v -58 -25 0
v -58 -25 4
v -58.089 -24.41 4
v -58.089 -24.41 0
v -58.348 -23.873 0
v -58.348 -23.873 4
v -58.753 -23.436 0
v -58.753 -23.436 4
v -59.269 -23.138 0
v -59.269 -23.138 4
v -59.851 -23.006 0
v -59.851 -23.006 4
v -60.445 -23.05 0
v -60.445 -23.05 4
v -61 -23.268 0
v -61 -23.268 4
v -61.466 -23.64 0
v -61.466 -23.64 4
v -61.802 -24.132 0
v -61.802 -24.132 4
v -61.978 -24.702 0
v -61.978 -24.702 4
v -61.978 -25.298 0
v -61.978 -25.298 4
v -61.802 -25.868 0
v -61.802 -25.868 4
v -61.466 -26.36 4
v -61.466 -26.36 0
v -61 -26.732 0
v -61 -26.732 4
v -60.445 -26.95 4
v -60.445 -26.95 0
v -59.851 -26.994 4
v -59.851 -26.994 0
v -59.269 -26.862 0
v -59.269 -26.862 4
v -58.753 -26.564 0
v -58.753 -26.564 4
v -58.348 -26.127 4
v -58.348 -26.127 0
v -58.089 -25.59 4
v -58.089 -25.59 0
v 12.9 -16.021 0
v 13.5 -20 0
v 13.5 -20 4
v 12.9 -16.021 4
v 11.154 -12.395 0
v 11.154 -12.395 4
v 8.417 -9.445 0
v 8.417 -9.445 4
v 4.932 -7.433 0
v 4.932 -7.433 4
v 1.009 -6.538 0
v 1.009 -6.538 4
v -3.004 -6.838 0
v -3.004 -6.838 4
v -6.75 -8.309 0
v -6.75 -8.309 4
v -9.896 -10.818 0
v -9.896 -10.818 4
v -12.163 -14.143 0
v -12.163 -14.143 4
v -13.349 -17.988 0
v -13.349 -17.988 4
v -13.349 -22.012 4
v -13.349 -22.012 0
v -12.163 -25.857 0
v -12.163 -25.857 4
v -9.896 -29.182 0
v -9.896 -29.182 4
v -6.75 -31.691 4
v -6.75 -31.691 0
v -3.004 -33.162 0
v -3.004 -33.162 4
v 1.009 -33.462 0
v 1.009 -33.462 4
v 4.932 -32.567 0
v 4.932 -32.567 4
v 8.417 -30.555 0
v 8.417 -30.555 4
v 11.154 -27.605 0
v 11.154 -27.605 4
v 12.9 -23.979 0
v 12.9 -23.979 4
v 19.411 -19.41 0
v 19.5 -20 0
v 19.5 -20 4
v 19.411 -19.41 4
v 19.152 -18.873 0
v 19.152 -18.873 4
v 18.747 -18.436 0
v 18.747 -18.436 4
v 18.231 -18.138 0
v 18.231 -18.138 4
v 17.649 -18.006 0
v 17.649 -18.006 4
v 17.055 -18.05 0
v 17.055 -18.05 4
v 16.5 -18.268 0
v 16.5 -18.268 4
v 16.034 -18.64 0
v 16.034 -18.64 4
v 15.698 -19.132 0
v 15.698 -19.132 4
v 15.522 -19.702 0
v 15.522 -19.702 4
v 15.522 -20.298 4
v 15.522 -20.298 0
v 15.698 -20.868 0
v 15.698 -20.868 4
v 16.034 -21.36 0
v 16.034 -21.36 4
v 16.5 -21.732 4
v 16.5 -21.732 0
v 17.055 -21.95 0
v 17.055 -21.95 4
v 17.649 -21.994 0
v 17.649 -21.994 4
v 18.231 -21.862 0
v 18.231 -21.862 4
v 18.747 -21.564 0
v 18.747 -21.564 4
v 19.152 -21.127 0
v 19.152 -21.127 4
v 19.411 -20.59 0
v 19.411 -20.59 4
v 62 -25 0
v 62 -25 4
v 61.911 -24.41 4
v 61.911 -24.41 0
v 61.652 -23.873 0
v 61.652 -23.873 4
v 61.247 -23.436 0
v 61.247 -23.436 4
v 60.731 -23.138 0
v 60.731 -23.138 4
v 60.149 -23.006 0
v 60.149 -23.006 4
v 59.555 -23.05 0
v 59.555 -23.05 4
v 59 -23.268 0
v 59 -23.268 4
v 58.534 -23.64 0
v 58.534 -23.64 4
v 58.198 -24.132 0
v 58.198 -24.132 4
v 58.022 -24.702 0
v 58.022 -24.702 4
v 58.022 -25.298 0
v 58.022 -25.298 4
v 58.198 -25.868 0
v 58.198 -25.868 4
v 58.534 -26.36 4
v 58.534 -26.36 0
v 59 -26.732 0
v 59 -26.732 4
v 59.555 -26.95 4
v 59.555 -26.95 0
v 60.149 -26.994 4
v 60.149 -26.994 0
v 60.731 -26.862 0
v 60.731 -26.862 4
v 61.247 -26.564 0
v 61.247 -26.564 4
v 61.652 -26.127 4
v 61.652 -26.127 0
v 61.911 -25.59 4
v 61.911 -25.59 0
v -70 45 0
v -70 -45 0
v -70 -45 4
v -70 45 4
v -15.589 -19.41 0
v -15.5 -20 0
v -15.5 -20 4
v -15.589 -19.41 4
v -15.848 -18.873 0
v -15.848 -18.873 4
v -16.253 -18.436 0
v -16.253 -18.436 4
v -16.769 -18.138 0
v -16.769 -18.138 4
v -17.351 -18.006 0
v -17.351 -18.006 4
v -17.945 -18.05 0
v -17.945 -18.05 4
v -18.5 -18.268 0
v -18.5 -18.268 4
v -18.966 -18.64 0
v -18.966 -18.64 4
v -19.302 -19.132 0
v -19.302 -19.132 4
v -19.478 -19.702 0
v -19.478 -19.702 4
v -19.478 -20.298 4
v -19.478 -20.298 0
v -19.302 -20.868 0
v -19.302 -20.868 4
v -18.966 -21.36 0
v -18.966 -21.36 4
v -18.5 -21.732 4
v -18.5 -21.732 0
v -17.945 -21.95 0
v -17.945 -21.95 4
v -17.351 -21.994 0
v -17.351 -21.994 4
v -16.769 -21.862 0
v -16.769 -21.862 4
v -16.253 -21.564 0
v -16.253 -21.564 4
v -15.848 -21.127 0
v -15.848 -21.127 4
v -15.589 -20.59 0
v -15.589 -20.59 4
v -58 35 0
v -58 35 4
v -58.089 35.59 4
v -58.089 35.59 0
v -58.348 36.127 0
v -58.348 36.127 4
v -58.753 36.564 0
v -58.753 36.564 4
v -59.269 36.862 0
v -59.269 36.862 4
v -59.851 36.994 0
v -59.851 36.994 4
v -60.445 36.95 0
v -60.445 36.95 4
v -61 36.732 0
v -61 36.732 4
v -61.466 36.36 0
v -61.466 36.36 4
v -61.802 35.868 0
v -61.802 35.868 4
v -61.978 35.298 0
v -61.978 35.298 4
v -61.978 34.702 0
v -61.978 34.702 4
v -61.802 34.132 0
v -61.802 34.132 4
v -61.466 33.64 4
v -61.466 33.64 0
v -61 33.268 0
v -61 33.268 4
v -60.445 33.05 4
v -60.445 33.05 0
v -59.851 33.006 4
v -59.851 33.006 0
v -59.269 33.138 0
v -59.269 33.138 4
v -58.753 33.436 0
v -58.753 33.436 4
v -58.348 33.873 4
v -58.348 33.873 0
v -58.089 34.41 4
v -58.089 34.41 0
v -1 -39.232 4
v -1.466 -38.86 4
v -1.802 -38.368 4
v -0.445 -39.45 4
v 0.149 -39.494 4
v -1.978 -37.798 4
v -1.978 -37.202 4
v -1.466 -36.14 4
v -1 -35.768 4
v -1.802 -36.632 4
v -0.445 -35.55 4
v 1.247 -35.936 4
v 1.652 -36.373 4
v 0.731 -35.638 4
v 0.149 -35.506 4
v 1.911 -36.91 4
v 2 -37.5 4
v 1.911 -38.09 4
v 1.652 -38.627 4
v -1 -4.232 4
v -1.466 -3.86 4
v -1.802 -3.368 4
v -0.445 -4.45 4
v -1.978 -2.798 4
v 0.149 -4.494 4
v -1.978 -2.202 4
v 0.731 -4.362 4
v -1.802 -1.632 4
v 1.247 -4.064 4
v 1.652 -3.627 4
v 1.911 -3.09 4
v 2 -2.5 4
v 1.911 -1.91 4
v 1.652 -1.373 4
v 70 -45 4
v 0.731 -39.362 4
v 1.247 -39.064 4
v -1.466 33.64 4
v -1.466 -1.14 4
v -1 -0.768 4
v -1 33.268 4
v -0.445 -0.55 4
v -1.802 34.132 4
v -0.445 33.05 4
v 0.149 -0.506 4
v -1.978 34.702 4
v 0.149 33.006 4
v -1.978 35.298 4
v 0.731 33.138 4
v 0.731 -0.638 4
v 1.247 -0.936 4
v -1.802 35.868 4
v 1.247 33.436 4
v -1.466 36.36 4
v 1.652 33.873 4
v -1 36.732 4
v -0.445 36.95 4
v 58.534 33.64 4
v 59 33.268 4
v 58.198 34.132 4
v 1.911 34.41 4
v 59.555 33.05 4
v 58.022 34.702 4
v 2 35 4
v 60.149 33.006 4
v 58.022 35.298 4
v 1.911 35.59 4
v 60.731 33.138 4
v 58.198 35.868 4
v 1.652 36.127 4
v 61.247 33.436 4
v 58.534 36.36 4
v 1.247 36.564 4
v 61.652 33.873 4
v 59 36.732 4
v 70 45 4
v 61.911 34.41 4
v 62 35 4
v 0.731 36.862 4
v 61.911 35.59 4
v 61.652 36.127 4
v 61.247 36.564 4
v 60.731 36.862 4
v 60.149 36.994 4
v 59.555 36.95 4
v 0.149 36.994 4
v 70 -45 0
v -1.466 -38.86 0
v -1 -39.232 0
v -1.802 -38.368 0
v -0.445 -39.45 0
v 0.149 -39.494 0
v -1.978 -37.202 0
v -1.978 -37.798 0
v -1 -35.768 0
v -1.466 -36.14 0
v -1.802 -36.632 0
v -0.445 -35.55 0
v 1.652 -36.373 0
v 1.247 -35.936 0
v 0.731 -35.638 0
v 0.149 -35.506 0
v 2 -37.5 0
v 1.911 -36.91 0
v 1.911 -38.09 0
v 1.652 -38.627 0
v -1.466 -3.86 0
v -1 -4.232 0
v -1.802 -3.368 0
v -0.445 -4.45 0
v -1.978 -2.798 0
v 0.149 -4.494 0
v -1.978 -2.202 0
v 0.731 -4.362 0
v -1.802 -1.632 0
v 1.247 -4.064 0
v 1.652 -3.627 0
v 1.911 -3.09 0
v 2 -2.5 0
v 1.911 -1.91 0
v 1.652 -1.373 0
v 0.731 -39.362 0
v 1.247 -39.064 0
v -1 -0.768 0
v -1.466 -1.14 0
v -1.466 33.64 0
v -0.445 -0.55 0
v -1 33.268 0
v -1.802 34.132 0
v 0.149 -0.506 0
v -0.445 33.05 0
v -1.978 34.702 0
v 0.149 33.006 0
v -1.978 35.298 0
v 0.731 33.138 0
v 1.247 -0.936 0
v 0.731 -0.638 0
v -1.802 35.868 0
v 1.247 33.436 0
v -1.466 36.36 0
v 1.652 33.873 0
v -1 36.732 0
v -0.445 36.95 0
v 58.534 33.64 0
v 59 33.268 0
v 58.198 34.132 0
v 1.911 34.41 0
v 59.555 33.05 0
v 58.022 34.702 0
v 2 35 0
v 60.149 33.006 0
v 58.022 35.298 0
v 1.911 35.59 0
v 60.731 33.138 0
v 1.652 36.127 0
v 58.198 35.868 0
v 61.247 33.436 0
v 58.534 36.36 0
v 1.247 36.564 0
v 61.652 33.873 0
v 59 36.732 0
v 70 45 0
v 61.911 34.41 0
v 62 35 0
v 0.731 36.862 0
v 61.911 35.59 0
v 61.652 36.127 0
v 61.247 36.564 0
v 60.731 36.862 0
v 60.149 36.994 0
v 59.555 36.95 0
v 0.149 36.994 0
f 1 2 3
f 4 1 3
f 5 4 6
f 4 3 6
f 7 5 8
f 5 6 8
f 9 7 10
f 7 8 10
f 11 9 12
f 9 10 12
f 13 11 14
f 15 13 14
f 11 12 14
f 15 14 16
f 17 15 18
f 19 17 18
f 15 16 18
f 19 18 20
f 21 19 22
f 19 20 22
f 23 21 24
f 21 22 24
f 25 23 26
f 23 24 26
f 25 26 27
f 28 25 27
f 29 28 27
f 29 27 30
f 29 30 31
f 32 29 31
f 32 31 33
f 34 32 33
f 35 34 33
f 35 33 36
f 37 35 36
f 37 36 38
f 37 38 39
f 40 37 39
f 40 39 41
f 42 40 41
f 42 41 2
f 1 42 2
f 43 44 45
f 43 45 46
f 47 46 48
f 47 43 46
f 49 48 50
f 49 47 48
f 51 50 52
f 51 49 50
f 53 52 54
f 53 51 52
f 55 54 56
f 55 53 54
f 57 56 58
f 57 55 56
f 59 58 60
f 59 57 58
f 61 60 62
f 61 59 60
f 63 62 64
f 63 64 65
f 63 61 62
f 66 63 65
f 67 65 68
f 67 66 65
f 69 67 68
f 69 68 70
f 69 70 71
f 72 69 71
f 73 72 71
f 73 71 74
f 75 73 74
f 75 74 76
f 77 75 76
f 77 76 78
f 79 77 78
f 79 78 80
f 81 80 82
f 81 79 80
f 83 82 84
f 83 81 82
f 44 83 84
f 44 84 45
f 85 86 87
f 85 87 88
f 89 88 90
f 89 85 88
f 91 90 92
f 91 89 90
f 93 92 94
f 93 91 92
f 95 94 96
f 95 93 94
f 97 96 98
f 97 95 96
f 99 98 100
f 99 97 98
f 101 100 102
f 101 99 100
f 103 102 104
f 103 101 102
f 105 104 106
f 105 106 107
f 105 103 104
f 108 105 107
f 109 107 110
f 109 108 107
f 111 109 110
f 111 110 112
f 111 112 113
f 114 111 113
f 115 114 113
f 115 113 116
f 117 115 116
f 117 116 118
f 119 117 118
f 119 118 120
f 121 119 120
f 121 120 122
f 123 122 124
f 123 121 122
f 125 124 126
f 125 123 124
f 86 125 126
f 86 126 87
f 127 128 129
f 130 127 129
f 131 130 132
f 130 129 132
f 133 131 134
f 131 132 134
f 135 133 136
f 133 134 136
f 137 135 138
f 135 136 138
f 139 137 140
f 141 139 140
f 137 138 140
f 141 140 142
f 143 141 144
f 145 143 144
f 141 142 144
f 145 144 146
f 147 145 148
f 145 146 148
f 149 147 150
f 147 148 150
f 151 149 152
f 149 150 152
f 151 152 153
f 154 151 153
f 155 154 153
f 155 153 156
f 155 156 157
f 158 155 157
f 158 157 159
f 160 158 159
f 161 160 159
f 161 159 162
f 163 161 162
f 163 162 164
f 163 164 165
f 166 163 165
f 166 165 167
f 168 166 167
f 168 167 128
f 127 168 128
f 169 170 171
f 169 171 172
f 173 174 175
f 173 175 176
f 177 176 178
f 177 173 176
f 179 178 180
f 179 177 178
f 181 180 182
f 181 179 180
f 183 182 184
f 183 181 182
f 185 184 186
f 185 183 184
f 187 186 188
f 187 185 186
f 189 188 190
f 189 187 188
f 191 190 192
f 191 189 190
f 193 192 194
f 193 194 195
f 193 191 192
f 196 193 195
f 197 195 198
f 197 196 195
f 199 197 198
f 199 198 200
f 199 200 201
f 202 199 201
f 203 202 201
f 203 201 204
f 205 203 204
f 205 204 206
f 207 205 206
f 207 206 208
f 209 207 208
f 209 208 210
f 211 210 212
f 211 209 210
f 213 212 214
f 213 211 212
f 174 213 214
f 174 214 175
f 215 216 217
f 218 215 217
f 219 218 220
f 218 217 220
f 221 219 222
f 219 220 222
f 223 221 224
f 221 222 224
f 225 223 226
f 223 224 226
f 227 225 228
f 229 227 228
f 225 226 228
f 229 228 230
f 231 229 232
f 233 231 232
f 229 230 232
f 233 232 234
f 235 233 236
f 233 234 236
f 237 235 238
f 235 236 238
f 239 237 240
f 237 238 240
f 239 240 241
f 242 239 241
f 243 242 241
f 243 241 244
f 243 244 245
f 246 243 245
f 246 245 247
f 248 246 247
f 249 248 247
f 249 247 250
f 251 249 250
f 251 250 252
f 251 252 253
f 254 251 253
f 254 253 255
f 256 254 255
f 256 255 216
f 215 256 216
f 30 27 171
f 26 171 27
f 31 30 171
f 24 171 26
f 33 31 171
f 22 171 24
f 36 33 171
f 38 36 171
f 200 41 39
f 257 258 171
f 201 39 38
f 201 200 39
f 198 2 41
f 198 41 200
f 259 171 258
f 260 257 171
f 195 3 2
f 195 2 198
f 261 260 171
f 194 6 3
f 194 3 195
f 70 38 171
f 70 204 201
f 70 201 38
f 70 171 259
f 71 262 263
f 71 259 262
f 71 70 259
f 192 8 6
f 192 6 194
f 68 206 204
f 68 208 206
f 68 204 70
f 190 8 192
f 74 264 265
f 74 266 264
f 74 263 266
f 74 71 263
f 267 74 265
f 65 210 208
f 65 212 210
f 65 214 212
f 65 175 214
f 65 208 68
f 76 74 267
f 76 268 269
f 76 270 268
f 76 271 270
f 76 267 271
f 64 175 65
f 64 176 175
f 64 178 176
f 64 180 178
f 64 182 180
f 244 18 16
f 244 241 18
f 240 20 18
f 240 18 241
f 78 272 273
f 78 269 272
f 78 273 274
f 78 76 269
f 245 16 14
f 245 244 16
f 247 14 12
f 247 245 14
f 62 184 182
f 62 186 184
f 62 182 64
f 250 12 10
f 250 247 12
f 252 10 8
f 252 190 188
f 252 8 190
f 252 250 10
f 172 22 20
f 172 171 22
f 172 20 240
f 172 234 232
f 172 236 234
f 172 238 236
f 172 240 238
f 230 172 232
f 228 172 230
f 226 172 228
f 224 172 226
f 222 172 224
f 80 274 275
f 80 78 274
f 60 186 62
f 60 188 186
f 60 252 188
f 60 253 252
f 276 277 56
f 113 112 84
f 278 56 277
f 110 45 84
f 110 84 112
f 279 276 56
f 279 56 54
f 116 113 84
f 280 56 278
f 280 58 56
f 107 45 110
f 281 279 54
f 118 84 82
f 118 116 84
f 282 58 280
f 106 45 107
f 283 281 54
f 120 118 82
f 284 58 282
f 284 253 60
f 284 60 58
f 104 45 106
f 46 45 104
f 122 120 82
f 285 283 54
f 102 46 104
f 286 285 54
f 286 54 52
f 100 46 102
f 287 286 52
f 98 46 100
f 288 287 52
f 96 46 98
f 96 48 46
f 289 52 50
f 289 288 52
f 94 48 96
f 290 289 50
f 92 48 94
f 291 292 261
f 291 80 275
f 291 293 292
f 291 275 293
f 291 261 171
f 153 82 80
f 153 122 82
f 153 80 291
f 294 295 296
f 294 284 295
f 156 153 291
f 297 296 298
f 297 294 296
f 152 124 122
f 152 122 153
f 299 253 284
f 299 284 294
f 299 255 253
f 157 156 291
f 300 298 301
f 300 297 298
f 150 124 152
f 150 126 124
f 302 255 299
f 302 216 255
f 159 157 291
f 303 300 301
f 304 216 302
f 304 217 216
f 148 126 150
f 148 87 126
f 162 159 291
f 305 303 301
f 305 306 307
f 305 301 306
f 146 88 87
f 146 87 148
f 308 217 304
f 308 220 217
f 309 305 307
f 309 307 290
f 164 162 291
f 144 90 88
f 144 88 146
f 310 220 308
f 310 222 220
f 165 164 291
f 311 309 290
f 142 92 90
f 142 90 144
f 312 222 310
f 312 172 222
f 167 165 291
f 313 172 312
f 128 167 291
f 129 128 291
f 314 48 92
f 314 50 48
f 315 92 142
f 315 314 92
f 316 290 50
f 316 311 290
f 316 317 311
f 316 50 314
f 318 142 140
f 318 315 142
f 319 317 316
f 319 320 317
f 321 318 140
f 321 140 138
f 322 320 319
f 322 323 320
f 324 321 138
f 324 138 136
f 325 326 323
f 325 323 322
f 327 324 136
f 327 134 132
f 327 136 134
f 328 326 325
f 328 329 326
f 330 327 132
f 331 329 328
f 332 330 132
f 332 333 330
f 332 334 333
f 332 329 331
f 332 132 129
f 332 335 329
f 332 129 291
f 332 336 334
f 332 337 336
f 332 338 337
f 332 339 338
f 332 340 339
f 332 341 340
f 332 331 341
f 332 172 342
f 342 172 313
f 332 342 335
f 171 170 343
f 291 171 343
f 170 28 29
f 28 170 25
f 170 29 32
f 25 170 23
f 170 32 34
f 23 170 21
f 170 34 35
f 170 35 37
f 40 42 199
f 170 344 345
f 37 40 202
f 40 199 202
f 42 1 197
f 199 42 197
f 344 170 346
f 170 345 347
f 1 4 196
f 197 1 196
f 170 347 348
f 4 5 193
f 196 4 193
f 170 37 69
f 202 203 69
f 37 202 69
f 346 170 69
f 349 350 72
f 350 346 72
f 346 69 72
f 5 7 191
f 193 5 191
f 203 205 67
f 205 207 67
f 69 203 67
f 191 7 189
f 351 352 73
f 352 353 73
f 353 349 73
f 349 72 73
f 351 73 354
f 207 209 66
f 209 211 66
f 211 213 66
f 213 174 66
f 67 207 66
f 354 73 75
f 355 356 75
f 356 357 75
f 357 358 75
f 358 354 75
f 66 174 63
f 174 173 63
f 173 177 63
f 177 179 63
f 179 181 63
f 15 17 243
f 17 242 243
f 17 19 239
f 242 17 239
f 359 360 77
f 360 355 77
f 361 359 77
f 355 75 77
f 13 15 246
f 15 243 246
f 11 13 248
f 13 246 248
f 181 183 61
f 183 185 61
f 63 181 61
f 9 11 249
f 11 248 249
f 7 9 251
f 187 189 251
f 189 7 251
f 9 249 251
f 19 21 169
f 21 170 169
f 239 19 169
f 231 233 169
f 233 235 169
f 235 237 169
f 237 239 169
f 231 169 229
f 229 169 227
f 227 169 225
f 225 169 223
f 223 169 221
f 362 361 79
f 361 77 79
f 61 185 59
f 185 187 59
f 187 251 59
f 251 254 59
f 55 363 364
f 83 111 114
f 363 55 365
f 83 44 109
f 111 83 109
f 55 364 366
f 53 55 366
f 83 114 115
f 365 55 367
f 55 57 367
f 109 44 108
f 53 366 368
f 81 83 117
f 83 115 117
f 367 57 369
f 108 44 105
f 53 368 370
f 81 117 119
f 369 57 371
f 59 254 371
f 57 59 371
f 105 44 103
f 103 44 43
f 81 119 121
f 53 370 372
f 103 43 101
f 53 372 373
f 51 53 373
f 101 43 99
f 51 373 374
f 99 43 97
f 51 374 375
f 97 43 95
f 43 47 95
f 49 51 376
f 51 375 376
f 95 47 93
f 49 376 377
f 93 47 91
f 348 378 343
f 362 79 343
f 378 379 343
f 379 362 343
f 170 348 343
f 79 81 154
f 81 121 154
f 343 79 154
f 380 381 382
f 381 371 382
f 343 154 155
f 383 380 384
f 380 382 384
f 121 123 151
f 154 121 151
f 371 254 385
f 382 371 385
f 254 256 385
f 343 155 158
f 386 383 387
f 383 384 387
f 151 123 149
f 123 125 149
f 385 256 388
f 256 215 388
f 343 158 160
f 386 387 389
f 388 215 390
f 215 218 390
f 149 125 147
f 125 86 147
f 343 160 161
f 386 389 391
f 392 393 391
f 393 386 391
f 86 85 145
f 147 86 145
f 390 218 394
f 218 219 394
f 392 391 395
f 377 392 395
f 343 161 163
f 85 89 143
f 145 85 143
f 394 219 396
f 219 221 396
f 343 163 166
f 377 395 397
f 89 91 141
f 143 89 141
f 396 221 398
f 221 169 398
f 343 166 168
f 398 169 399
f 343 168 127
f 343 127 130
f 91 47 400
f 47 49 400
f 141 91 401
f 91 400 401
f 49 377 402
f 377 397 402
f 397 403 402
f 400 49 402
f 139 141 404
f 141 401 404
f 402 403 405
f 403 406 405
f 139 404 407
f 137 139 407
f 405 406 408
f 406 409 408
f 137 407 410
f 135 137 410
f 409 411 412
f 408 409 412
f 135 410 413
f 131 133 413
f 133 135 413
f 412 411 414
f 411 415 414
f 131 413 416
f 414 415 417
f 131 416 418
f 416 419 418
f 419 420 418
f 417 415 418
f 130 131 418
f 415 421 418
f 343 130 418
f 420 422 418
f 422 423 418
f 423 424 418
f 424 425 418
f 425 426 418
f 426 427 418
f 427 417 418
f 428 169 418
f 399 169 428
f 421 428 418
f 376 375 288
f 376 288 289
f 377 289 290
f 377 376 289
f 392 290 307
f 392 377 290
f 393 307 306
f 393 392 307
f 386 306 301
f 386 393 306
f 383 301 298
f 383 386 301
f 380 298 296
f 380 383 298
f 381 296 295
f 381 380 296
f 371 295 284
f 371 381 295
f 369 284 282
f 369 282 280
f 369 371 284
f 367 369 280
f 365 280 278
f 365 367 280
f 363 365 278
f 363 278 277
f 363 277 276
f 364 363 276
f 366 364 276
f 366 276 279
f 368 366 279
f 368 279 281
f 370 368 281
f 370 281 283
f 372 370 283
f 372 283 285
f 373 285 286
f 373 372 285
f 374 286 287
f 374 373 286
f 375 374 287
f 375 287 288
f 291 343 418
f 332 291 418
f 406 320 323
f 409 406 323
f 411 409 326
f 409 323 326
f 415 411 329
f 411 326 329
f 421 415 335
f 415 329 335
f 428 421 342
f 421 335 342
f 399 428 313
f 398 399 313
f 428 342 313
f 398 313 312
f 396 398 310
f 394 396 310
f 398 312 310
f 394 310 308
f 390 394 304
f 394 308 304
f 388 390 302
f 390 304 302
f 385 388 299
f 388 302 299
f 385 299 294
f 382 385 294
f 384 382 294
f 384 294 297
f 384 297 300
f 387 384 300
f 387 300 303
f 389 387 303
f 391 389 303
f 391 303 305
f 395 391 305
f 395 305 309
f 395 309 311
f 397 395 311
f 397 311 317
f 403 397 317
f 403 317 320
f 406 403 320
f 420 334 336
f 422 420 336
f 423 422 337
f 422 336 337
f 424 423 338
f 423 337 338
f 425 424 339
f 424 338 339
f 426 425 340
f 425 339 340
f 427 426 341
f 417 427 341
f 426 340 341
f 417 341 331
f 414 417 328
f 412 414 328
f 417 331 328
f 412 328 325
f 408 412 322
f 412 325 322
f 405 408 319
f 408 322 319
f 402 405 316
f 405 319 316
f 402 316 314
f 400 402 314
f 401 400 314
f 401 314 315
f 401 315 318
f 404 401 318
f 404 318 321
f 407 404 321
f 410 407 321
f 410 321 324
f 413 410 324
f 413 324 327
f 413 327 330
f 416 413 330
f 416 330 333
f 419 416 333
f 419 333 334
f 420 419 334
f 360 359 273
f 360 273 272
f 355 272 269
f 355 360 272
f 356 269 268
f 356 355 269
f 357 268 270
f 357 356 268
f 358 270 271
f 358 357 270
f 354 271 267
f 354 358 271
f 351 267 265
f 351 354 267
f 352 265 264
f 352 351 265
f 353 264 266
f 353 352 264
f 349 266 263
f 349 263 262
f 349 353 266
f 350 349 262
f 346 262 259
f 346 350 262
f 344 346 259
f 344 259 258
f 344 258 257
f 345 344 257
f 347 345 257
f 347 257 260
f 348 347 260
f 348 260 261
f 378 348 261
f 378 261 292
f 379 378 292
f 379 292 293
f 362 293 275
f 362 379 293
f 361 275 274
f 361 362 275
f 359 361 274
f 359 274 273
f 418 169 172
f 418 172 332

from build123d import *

# Parameters (mm, degrees)
SKETCH1_W           = 140
SKETCH1_H           = 90
SKETCH1_R           = 2
SKETCH1_R_2         = 13.5
BOSS_EXTRUDE1_DEPTH = 4
SKETCH2_R           = 2
CUT_EXTRUDE1_DEPTH  = 5
SKETCH3_R           = 2
CUT_EXTRUDE2_DEPTH  = 5


with BuildPart() as part:
    # Sketch1 → Boss-Extrude1 (new body)
    with BuildSketch(Plane.XY):
        Rectangle(SKETCH1_W, SKETCH1_H)
        with Locations((0, -2.5)):
            Circle(SKETCH1_R, mode=Mode.SUBTRACT)
        with Locations((17.5, -20)):
            Circle(SKETCH1_R, mode=Mode.SUBTRACT)
        with Locations((0, -37.5)):
            Circle(SKETCH1_R, mode=Mode.SUBTRACT)
        with Locations((-17.5, -20)):
            Circle(SKETCH1_R, mode=Mode.SUBTRACT)
        with Locations((0, -20)):
            Circle(SKETCH1_R_2, mode=Mode.SUBTRACT)
    extrude(amount=BOSS_EXTRUDE1_DEPTH)

    # Sketch2 → Cut-Extrude1 (cut, through all)
    with BuildSketch(Plane.XY.offset(4)):
        with Locations((0, 35)):
            Circle(SKETCH2_R)
        with Locations((-60, 35)):
            Circle(SKETCH2_R)
        with Locations((60, 35)):
            Circle(SKETCH2_R)
    extrude(amount=-CUT_EXTRUDE1_DEPTH, mode=Mode.SUBTRACT)

    # Sketch3 → Cut-Extrude2 (cut, through all)
    with BuildSketch(Plane.XY.offset(4)):
        with Locations((-60, -25)):
            Circle(SKETCH3_R)
        with Locations((-60, -85)):
            Circle(SKETCH3_R)
        with Locations((60, -85)):
            Circle(SKETCH3_R)
        with Locations((60, -25)):
            Circle(SKETCH3_R)
    extrude(amount=-CUT_EXTRUDE2_DEPTH, mode=Mode.SUBTRACT)


solid = part.part
